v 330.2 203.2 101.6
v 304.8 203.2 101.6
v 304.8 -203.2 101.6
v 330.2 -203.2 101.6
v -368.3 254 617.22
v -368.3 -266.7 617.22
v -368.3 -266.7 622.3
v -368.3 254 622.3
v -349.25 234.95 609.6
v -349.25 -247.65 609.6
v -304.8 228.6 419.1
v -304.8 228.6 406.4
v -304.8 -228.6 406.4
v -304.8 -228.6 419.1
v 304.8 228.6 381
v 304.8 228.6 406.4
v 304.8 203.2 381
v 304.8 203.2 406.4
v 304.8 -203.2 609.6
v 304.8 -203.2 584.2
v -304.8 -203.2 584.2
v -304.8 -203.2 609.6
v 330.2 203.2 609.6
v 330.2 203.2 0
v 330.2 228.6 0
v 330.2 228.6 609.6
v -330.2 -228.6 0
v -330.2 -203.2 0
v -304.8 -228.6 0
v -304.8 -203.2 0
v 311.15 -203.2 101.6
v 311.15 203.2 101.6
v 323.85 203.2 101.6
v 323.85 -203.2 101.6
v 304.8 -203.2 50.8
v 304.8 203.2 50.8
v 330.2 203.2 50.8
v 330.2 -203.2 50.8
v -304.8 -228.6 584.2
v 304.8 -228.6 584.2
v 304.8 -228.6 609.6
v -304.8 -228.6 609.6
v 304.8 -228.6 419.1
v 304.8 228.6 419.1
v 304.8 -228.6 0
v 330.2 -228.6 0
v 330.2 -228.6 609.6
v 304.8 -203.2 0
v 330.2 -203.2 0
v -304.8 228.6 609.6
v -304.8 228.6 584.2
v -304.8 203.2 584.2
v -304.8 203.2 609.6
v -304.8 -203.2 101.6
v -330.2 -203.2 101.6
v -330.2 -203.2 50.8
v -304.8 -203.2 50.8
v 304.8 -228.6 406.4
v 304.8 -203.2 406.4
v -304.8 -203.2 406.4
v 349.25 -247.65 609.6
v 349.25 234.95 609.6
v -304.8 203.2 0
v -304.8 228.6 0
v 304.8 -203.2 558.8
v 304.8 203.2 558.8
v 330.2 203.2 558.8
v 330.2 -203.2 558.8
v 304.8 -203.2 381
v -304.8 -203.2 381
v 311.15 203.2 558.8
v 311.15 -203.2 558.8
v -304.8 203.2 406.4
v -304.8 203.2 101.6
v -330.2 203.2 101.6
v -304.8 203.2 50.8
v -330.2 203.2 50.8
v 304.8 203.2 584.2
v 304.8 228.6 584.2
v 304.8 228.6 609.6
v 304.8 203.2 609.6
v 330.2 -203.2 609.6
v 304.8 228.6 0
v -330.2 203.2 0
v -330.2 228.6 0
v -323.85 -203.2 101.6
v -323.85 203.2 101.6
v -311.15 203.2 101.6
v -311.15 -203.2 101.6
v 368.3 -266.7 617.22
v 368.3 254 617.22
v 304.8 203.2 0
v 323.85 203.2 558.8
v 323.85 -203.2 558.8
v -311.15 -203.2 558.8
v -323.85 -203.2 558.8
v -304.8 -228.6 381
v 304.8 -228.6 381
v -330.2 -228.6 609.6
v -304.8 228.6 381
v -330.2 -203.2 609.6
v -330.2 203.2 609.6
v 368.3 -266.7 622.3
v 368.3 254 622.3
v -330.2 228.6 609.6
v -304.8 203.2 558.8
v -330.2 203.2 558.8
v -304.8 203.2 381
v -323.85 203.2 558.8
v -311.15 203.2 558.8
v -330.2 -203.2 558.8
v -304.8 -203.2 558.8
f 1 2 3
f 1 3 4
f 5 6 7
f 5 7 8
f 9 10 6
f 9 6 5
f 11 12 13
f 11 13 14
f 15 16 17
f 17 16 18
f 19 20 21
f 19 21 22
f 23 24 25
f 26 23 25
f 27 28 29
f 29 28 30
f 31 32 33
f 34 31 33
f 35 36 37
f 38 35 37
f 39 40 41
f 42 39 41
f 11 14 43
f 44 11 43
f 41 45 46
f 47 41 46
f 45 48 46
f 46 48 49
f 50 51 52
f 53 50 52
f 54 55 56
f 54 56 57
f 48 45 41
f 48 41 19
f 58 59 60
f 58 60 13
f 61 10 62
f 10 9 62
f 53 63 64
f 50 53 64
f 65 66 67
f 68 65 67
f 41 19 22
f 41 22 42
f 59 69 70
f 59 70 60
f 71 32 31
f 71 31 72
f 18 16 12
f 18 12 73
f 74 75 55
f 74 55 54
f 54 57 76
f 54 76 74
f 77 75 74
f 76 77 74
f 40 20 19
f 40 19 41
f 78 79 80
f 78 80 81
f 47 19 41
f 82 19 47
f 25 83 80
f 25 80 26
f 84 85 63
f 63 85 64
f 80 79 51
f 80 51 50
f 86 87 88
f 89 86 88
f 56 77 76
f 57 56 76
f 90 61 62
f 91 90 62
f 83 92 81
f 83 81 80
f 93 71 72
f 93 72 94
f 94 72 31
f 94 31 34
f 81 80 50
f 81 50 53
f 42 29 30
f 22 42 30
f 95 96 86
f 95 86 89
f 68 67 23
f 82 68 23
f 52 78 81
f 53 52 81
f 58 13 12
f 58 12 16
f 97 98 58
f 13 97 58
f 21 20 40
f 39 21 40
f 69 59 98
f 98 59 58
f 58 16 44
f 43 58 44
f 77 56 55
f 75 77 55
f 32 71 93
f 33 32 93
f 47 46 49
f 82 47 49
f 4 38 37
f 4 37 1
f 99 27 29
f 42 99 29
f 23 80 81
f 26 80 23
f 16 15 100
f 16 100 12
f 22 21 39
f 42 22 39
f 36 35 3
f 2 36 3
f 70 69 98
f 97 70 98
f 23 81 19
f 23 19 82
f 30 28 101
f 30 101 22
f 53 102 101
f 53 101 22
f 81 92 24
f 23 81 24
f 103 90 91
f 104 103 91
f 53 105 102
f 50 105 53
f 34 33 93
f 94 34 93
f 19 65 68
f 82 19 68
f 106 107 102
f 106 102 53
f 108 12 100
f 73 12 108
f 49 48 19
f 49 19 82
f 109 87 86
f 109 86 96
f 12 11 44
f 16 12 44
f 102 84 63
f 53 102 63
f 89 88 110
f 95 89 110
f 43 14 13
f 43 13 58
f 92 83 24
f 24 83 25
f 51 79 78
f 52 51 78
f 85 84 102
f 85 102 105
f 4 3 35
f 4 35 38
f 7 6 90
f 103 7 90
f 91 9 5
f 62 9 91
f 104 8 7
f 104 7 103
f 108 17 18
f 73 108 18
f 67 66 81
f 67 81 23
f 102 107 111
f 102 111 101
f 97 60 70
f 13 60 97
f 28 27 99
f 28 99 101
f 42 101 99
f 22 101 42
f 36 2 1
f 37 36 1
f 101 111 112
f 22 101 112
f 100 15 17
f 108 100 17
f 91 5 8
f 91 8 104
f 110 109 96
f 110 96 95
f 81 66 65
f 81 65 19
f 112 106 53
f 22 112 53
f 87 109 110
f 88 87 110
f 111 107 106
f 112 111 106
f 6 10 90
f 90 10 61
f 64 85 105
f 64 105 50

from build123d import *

# Parameters (mm, degrees)
F0_W      = 25.4
F0_H      = 25.4
F1_DEPTH  = 609.6
F2_W      = 25.4
F2_H      = 50.8
F3_DEPTH  = 406.4
F4_W      = 12.7
F4_H      = 457.2
F5_DEPTH  = 406.4
F6_W      = 25.4
F6_H      = 25.4
F7_DEPTH  = 609.6
F8_W      = 609.6
F8_H      = 12.7
F9_DEPTH  = 457.2
F10_W     = 736.6
F10_H     = 520.7
F10_W_2   = 25.4
F10_H_2   = 406.4
F11_DEPTH = 12.7
F12_SIZE2 = 19.05
F12_SIZE  = 7.62


with BuildPart() as f1:
    # F0 (on Top) → F1 (new body)
    with BuildSketch(Plane.XY):
        with Locations((-317.5, 215.9)):
            Rectangle(F0_W, F0_H)
    extrude(amount=F1_DEPTH)


with BuildPart() as f1b:
    # F0 (on Top) → F1, piece 2 (new body)
    with BuildSketch(Plane.XY):
        with Locations((317.5, 215.9)):
            Rectangle(F0_W, F0_H)
    extrude(amount=F1_DEPTH)


with BuildPart() as f1c:
    # F0 (on Top) → F1, piece 3 (new body)
    with BuildSketch(Plane.XY):
        with Locations((317.5, -215.9)):
            Rectangle(F0_W, F0_H)
    extrude(amount=F1_DEPTH)


with BuildPart() as f1d:
    # F0 (on Top) → F1, piece 4 (new body)
    with BuildSketch(Plane.XY):
        with Locations((-317.5, -215.9)):
            Rectangle(F0_W, F0_H)
    extrude(amount=F1_DEPTH)


with BuildPart() as f3:
    # F2 (on face) → F3 (new body, through all)
    with BuildSketch(Plane.XZ.offset(-203.2)):
        with Locations((-317.5, 584.2)):
            Rectangle(F2_W, F2_H)
    extrude(amount=F3_DEPTH)


with BuildPart() as f3b:
    # F2 (on face) → F3, piece 2 (new body, through all)
    with BuildSketch(Plane.XZ.offset(-203.2)):
        with Locations((317.5, 584.2)):
            Rectangle(F2_W, F2_H)
    extrude(amount=F3_DEPTH)


with BuildPart() as f3c:
    # F2 (on face) → F3, piece 3 (new body, through all)
    with BuildSketch(Plane.XZ.offset(-203.2)):
        with Locations((317.5, 76.2)):
            Rectangle(F2_W, F2_H)
    extrude(amount=F3_DEPTH)


with BuildPart() as f3d:
    # F2 (on face) → F3, piece 4 (new body, through all)
    with BuildSketch(Plane.XZ.offset(-203.2)):
        with Locations((-317.5, 76.2)):
            Rectangle(F2_W, F2_H)
    extrude(amount=F3_DEPTH)


with BuildPart() as f5:
    # F4 (on face) → F5 (new body, through all)
    with BuildSketch(Plane.XZ.offset(-203.2)):
        with Locations((317.5, 330.2)):
            Rectangle(F4_W, F4_H)
    extrude(amount=F5_DEPTH)


with BuildPart() as f5b:
    # F4 (on face) → F5, piece 2 (new body, through all)
    with BuildSketch(Plane.XZ.offset(-203.2)):
        with Locations((-317.5, 330.2)):
            Rectangle(F4_W, F4_H)
    extrude(amount=F5_DEPTH)


with BuildPart() as f7:
    # F6 (on face) → F7 (new body, through all)
    with BuildSketch(Plane(origin=(304.8, 0, 0), x_dir=(0, -1, 0), z_dir=(-1, 0, 0))):
        with Locations((-215.9, 596.9)):
            Rectangle(F6_W, F6_H)
    extrude(amount=F7_DEPTH)


with BuildPart() as f7b:
    # F6 (on face) → F7, piece 2 (new body, through all)
    with BuildSketch(Plane(origin=(304.8, 0, 0), x_dir=(0, -1, 0), z_dir=(-1, 0, 0))):
        with Locations((-215.9, 393.7)):
            Rectangle(F6_W, F6_H)
    extrude(amount=F7_DEPTH)


with BuildPart() as f7c:
    # F6 (on face) → F7, piece 3 (new body, through all)
    with BuildSketch(Plane(origin=(304.8, 0, 0), x_dir=(0, -1, 0), z_dir=(-1, 0, 0))):
        with Locations((215.9, 393.7)):
            Rectangle(F6_W, F6_H)
    extrude(amount=F7_DEPTH)


with BuildPart() as f7d:
    # F6 (on face) → F7, piece 4 (new body, through all)
    with BuildSketch(Plane(origin=(304.8, 0, 0), x_dir=(0, -1, 0), z_dir=(-1, 0, 0))):
        with Locations((215.9, 596.9)):
            Rectangle(F6_W, F6_H)
    extrude(amount=F7_DEPTH)


with BuildPart() as f9:
    # F8 (on face) → F9 (new body, through all)
    with BuildSketch(Plane.XZ.offset(228.6)):
        with Locations((0, 412.75)):
            Rectangle(F8_W, F8_H)
    extrude(amount=-F9_DEPTH)


with BuildPart() as f11:
    # F10 (on face) → F11 (new body)
    with BuildSketch(Plane.XY.offset(609.6)):
        with Locations((0, -6.35)):
            Rectangle(F10_W, F10_H)
        with Locations((-317.5, 0)):
            Rectangle(F10_W_2, F10_H_2, mode=Mode.SUBTRACT)
        with Locations((-317.5, 0)):
            Rectangle(F10_W_2, F10_H_2)
    extrude(amount=F11_DEPTH)

    # F12
    f12_edges = [f11.edges().sort_by_distance(p)[0] for p in [
        (0, -266.7, 609.6),
        (-368.3, -6.35, 609.6),
        (368.3, -6.35, 609.6),
        (0, 254, 609.6),
    ]]
    chamfer(f12_edges, length=F12_SIZE, length2=F12_SIZE2)


solid = Compound([f1.part, f1b.part, f1c.part, f1d.part, f3.part, f3b.part, f3c.part, f3d.part, f5.part, f5b.part, f7.part, f7b.part, f7c.part, f7d.part, f9.part, f11.part])
